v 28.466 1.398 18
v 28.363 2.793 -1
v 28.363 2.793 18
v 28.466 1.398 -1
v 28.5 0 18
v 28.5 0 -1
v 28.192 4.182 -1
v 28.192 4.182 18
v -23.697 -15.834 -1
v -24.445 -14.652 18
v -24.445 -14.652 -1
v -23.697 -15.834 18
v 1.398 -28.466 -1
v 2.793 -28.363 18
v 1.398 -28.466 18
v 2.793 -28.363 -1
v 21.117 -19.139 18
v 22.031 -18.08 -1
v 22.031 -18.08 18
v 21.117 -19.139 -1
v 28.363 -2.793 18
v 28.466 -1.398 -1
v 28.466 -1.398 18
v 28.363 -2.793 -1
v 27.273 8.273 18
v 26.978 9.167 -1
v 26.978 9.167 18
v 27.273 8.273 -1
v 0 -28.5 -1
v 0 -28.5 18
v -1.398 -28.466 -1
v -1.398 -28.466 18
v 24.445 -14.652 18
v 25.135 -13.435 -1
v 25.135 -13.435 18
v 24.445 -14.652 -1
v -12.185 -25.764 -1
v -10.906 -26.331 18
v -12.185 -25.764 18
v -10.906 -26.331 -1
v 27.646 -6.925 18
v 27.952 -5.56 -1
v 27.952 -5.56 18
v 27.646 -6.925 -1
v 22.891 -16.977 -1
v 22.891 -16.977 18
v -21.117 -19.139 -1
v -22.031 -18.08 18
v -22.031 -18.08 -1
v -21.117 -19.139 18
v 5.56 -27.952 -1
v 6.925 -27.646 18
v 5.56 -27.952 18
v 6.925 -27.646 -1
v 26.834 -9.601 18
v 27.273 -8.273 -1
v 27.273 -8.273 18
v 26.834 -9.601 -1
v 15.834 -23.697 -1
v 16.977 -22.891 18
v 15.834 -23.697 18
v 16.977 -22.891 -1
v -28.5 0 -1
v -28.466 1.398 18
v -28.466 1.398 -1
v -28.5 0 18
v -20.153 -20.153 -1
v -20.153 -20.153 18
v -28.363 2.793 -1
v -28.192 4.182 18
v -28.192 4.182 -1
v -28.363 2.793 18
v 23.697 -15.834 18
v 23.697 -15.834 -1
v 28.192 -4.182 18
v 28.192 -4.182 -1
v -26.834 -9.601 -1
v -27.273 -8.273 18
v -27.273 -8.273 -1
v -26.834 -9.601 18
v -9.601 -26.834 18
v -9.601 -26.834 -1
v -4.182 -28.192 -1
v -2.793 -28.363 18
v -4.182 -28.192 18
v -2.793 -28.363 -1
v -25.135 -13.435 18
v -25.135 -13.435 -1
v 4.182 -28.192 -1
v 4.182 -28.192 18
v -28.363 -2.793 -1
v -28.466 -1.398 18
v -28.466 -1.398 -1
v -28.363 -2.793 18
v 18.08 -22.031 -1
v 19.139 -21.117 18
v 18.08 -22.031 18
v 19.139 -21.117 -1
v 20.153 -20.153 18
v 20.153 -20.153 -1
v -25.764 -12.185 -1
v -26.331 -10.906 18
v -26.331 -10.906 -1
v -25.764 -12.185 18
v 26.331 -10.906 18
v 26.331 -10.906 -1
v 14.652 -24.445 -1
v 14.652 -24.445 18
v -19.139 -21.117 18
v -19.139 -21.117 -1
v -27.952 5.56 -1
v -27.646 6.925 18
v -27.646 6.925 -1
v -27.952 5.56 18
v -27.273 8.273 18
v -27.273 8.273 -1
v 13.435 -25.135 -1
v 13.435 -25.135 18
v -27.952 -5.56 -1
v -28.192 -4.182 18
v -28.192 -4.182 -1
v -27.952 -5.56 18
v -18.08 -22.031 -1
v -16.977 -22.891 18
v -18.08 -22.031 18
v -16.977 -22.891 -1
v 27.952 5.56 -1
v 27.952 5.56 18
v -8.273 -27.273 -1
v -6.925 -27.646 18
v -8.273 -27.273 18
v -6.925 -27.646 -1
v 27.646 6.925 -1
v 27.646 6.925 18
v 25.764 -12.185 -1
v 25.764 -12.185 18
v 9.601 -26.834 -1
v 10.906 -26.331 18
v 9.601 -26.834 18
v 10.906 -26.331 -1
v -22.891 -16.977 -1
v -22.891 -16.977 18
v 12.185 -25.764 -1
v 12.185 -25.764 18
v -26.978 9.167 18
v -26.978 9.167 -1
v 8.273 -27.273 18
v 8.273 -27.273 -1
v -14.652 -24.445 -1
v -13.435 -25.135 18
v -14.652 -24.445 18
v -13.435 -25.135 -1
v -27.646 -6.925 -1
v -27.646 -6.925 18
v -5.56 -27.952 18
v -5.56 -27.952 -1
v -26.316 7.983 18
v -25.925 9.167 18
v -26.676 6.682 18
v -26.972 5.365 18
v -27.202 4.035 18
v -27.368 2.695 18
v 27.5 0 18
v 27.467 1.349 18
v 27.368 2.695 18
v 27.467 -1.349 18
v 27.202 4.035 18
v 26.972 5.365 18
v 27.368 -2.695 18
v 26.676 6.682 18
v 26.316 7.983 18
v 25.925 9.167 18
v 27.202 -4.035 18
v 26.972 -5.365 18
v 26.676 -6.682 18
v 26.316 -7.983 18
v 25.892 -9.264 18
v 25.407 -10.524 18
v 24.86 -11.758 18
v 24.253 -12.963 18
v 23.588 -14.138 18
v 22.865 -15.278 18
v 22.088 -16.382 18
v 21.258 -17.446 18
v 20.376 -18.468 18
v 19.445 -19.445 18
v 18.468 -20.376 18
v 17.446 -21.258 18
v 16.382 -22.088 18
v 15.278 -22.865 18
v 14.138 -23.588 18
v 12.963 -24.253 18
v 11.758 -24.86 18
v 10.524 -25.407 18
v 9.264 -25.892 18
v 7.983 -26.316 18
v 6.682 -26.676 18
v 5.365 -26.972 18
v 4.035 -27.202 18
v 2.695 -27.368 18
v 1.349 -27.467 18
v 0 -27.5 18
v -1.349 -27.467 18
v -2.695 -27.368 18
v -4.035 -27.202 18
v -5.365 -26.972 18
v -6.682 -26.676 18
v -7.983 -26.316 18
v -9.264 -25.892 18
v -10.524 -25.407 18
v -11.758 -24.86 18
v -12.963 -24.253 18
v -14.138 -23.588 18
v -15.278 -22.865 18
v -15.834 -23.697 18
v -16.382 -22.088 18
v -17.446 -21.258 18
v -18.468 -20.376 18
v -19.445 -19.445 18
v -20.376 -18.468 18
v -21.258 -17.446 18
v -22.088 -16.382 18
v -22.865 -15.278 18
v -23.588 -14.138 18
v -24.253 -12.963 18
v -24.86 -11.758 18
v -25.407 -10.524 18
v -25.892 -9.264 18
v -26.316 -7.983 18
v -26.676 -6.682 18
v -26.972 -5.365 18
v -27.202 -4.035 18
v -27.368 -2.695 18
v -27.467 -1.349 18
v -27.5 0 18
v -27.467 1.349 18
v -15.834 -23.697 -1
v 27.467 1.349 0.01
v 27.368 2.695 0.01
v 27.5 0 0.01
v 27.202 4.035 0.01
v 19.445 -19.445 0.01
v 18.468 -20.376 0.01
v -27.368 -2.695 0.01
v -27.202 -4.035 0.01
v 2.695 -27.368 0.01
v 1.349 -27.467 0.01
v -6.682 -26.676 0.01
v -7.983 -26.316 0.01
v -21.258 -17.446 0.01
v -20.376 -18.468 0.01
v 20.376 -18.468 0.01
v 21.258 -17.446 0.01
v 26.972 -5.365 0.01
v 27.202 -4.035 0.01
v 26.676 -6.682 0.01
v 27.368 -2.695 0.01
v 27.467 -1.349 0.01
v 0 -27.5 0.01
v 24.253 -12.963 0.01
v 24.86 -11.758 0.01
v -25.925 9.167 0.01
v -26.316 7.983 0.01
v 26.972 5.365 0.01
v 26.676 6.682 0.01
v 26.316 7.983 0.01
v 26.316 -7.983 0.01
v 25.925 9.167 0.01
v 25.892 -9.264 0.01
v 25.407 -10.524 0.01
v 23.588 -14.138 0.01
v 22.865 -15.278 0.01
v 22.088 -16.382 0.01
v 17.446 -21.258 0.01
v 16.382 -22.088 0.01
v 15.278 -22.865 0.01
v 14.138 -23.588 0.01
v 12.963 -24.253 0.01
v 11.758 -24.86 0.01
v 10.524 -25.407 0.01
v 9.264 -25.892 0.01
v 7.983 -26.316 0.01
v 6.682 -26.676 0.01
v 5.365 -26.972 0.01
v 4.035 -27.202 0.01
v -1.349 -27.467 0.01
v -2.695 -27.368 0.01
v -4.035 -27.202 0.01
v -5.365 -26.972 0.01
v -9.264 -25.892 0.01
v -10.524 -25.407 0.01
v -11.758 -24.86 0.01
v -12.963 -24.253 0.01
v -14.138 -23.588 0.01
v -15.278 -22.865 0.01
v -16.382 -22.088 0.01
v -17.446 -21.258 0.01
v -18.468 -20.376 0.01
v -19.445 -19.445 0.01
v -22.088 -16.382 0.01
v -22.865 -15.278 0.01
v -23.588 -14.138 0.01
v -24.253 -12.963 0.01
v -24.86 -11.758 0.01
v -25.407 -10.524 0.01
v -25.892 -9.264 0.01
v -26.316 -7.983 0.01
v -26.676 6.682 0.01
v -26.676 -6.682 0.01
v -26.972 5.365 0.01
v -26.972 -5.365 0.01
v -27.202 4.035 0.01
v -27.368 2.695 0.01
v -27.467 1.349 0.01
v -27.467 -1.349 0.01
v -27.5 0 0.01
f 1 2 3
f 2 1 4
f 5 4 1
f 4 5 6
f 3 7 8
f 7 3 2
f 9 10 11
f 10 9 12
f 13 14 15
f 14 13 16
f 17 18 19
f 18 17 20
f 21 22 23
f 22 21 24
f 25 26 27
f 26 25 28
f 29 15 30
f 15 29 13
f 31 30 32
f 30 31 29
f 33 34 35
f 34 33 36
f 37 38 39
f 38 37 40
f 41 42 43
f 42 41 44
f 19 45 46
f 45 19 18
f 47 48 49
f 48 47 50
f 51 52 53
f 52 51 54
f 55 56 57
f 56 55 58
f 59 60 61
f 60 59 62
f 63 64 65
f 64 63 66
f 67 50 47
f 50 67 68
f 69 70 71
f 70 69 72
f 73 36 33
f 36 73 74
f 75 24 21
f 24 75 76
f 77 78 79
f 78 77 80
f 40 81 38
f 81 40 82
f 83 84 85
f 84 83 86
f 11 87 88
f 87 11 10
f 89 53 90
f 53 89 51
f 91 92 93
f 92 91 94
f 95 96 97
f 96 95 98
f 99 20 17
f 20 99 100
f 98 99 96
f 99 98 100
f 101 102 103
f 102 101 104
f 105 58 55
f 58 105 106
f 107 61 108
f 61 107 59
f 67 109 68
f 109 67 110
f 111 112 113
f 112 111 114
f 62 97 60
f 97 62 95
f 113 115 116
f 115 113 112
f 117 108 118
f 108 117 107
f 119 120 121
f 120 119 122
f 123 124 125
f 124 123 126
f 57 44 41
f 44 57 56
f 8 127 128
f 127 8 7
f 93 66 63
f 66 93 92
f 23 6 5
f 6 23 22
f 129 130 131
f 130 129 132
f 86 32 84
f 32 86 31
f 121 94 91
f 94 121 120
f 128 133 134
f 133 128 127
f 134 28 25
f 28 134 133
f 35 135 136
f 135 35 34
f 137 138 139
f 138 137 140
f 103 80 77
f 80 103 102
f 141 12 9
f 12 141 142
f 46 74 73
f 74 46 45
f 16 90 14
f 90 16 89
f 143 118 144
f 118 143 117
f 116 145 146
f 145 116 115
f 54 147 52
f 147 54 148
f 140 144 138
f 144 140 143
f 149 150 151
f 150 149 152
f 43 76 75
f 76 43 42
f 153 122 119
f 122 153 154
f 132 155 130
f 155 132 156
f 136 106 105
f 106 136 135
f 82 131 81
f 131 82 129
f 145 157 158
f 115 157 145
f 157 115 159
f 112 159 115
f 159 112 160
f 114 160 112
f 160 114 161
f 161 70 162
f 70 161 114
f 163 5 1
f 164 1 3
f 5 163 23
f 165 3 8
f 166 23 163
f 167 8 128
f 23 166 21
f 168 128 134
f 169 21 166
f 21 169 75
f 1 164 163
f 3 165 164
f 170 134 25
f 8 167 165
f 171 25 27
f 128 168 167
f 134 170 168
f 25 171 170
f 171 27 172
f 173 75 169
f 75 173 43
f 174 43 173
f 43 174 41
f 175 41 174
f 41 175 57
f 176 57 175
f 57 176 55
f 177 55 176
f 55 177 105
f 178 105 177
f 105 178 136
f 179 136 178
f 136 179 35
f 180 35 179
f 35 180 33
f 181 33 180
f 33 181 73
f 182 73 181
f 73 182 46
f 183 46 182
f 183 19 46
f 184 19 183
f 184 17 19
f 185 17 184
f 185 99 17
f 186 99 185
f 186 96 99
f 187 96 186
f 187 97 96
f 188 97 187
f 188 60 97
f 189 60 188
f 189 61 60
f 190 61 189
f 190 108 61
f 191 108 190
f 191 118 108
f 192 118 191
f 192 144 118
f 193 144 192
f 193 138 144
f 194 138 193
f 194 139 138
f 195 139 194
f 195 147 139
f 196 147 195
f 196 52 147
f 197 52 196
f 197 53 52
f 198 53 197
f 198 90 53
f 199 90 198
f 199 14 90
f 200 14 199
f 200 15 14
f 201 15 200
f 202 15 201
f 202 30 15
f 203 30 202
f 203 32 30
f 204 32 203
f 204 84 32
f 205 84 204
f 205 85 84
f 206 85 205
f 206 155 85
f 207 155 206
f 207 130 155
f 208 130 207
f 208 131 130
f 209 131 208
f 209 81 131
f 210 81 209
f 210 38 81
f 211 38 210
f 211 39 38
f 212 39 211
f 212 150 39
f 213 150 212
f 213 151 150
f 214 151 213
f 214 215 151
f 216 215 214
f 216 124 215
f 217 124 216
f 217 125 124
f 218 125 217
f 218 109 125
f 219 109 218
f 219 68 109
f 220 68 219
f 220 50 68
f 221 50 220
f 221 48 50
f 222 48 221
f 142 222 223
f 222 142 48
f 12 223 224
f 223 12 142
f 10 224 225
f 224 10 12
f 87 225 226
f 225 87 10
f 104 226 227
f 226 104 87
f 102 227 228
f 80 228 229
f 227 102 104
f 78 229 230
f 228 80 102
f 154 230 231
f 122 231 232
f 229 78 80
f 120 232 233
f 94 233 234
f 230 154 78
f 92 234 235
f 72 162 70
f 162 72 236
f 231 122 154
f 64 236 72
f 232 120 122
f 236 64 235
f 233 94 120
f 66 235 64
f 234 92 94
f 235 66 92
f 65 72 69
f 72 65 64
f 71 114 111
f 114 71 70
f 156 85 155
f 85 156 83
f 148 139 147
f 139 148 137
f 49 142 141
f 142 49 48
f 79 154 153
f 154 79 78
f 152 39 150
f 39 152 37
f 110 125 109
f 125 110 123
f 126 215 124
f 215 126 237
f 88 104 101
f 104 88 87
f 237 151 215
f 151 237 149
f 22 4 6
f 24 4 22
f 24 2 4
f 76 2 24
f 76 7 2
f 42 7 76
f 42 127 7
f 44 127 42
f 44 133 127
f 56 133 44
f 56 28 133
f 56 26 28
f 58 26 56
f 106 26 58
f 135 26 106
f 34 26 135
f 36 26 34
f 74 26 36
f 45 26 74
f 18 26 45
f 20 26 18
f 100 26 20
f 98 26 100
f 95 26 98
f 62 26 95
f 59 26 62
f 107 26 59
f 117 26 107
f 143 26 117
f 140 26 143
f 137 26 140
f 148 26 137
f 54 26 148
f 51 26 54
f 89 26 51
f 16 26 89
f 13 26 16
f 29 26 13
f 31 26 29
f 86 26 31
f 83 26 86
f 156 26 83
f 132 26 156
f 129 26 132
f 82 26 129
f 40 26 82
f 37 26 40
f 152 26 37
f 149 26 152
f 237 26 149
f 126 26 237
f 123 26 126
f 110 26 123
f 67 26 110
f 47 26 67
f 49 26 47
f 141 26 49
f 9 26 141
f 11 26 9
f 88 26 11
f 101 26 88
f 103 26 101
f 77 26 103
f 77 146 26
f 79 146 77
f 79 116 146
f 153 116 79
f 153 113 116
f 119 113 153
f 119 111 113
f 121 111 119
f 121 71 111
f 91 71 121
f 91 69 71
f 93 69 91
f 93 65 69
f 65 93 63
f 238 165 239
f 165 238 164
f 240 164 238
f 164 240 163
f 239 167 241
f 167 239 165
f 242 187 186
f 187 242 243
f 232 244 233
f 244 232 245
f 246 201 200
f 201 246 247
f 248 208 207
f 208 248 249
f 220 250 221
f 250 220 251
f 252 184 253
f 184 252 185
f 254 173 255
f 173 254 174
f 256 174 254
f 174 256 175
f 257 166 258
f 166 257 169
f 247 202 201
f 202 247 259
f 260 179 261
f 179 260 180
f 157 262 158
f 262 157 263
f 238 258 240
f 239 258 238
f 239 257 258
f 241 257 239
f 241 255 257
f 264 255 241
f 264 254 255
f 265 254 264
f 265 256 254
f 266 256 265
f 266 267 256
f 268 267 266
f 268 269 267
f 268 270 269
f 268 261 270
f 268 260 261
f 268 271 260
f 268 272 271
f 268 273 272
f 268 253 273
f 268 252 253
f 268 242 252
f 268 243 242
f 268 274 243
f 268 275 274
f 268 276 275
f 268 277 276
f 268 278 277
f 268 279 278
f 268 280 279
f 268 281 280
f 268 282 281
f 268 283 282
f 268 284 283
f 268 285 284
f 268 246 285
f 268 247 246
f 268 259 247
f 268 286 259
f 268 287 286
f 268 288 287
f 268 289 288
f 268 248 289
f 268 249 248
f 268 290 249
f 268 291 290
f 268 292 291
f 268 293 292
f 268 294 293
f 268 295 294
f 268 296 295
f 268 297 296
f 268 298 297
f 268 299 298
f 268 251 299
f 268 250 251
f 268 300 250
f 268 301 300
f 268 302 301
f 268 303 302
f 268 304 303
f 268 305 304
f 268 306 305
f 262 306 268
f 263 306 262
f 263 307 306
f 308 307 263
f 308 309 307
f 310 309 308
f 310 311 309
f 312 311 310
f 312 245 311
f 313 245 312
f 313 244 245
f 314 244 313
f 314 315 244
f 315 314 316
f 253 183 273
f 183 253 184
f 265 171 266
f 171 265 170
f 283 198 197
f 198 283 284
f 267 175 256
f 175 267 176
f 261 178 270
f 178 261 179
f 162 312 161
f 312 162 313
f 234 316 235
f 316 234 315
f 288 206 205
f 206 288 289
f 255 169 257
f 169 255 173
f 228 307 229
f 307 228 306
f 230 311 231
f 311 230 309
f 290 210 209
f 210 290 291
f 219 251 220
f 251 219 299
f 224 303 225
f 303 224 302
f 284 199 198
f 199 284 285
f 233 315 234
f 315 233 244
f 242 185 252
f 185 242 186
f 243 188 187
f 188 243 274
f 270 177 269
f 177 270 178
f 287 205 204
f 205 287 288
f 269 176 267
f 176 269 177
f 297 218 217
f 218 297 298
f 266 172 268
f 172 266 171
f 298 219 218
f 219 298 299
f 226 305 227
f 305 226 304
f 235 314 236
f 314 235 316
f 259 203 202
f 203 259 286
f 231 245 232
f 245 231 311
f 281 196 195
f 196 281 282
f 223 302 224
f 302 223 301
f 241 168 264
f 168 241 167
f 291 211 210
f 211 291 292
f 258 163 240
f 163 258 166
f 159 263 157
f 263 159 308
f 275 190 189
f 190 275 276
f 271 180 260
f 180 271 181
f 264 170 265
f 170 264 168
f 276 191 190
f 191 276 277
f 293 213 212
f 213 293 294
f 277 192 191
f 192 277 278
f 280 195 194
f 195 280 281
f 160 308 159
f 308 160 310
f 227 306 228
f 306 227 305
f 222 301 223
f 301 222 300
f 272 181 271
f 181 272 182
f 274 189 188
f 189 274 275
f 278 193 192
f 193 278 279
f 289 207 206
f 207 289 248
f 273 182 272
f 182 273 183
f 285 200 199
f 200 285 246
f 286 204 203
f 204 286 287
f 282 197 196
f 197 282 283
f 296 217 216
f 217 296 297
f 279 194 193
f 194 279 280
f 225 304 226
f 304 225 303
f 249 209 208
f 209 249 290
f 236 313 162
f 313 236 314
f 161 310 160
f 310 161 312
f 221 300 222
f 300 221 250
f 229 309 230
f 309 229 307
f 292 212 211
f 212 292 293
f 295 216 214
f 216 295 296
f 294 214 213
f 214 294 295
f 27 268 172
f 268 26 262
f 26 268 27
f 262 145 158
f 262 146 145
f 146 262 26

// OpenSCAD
// dc-flask-base
// Configurable flared base for flasks, test tubes or other cylindrical objects
// Copyright 2014-2016 Nicholas Brookins and Danger Creations, LLC
// http://dangercreations.com/
// https://github.com/nbrookins/danger-gadgets.git
// http://www.thingiverse.com/knick

fnv=128;

//diameter of the hole, should be about the same as the vessel you'd like to hold
inside_diameter = 55;
//depth of the hole
inside_depth = 18;
//thickness of the material under the vessel.  This can be 0 to make it go through, or as high as you'd like to lift the vessel
bottom_thickness = 0;
//width of the extra supporting flare.  should be greater than the inside_diameter, but smaller than outside_diameter.
flare_diameter = 55;
//the width of the overall base
outside_diameter = 57;
//thickness of the outside edge
outside_thickness = 1;

union(){
	difference(){
		union(){
			cylinder(d1=flare_diameter+ outside_thickness*2, d2=inside_diameter + outside_thickness*2, h= inside_depth + bottom_thickness, $fn=fnv);
			translate([0,0,-outside_thickness])
			cylinder(d1=outside_diameter, d2=flare_diameter+ outside_thickness*2, h=outside_thickness, $fn=fnv);
            
		//	translate([0,0,-outside_thickness*3])
		//	cylinder(d1=outside_diameter, d2=outside_diameter, h=outside_thickness, $fn=fnv);
			
		}
		translate([0,0,bottom_thickness +.01])
		cylinder(d=inside_diameter, h=inside_depth, $fn=fnv);
        
        translate([0,inside_diameter/1.5,0])
        cube([inside_diameter, inside_diameter, inside_diameter], center=true);
	}
}

//55 diam
